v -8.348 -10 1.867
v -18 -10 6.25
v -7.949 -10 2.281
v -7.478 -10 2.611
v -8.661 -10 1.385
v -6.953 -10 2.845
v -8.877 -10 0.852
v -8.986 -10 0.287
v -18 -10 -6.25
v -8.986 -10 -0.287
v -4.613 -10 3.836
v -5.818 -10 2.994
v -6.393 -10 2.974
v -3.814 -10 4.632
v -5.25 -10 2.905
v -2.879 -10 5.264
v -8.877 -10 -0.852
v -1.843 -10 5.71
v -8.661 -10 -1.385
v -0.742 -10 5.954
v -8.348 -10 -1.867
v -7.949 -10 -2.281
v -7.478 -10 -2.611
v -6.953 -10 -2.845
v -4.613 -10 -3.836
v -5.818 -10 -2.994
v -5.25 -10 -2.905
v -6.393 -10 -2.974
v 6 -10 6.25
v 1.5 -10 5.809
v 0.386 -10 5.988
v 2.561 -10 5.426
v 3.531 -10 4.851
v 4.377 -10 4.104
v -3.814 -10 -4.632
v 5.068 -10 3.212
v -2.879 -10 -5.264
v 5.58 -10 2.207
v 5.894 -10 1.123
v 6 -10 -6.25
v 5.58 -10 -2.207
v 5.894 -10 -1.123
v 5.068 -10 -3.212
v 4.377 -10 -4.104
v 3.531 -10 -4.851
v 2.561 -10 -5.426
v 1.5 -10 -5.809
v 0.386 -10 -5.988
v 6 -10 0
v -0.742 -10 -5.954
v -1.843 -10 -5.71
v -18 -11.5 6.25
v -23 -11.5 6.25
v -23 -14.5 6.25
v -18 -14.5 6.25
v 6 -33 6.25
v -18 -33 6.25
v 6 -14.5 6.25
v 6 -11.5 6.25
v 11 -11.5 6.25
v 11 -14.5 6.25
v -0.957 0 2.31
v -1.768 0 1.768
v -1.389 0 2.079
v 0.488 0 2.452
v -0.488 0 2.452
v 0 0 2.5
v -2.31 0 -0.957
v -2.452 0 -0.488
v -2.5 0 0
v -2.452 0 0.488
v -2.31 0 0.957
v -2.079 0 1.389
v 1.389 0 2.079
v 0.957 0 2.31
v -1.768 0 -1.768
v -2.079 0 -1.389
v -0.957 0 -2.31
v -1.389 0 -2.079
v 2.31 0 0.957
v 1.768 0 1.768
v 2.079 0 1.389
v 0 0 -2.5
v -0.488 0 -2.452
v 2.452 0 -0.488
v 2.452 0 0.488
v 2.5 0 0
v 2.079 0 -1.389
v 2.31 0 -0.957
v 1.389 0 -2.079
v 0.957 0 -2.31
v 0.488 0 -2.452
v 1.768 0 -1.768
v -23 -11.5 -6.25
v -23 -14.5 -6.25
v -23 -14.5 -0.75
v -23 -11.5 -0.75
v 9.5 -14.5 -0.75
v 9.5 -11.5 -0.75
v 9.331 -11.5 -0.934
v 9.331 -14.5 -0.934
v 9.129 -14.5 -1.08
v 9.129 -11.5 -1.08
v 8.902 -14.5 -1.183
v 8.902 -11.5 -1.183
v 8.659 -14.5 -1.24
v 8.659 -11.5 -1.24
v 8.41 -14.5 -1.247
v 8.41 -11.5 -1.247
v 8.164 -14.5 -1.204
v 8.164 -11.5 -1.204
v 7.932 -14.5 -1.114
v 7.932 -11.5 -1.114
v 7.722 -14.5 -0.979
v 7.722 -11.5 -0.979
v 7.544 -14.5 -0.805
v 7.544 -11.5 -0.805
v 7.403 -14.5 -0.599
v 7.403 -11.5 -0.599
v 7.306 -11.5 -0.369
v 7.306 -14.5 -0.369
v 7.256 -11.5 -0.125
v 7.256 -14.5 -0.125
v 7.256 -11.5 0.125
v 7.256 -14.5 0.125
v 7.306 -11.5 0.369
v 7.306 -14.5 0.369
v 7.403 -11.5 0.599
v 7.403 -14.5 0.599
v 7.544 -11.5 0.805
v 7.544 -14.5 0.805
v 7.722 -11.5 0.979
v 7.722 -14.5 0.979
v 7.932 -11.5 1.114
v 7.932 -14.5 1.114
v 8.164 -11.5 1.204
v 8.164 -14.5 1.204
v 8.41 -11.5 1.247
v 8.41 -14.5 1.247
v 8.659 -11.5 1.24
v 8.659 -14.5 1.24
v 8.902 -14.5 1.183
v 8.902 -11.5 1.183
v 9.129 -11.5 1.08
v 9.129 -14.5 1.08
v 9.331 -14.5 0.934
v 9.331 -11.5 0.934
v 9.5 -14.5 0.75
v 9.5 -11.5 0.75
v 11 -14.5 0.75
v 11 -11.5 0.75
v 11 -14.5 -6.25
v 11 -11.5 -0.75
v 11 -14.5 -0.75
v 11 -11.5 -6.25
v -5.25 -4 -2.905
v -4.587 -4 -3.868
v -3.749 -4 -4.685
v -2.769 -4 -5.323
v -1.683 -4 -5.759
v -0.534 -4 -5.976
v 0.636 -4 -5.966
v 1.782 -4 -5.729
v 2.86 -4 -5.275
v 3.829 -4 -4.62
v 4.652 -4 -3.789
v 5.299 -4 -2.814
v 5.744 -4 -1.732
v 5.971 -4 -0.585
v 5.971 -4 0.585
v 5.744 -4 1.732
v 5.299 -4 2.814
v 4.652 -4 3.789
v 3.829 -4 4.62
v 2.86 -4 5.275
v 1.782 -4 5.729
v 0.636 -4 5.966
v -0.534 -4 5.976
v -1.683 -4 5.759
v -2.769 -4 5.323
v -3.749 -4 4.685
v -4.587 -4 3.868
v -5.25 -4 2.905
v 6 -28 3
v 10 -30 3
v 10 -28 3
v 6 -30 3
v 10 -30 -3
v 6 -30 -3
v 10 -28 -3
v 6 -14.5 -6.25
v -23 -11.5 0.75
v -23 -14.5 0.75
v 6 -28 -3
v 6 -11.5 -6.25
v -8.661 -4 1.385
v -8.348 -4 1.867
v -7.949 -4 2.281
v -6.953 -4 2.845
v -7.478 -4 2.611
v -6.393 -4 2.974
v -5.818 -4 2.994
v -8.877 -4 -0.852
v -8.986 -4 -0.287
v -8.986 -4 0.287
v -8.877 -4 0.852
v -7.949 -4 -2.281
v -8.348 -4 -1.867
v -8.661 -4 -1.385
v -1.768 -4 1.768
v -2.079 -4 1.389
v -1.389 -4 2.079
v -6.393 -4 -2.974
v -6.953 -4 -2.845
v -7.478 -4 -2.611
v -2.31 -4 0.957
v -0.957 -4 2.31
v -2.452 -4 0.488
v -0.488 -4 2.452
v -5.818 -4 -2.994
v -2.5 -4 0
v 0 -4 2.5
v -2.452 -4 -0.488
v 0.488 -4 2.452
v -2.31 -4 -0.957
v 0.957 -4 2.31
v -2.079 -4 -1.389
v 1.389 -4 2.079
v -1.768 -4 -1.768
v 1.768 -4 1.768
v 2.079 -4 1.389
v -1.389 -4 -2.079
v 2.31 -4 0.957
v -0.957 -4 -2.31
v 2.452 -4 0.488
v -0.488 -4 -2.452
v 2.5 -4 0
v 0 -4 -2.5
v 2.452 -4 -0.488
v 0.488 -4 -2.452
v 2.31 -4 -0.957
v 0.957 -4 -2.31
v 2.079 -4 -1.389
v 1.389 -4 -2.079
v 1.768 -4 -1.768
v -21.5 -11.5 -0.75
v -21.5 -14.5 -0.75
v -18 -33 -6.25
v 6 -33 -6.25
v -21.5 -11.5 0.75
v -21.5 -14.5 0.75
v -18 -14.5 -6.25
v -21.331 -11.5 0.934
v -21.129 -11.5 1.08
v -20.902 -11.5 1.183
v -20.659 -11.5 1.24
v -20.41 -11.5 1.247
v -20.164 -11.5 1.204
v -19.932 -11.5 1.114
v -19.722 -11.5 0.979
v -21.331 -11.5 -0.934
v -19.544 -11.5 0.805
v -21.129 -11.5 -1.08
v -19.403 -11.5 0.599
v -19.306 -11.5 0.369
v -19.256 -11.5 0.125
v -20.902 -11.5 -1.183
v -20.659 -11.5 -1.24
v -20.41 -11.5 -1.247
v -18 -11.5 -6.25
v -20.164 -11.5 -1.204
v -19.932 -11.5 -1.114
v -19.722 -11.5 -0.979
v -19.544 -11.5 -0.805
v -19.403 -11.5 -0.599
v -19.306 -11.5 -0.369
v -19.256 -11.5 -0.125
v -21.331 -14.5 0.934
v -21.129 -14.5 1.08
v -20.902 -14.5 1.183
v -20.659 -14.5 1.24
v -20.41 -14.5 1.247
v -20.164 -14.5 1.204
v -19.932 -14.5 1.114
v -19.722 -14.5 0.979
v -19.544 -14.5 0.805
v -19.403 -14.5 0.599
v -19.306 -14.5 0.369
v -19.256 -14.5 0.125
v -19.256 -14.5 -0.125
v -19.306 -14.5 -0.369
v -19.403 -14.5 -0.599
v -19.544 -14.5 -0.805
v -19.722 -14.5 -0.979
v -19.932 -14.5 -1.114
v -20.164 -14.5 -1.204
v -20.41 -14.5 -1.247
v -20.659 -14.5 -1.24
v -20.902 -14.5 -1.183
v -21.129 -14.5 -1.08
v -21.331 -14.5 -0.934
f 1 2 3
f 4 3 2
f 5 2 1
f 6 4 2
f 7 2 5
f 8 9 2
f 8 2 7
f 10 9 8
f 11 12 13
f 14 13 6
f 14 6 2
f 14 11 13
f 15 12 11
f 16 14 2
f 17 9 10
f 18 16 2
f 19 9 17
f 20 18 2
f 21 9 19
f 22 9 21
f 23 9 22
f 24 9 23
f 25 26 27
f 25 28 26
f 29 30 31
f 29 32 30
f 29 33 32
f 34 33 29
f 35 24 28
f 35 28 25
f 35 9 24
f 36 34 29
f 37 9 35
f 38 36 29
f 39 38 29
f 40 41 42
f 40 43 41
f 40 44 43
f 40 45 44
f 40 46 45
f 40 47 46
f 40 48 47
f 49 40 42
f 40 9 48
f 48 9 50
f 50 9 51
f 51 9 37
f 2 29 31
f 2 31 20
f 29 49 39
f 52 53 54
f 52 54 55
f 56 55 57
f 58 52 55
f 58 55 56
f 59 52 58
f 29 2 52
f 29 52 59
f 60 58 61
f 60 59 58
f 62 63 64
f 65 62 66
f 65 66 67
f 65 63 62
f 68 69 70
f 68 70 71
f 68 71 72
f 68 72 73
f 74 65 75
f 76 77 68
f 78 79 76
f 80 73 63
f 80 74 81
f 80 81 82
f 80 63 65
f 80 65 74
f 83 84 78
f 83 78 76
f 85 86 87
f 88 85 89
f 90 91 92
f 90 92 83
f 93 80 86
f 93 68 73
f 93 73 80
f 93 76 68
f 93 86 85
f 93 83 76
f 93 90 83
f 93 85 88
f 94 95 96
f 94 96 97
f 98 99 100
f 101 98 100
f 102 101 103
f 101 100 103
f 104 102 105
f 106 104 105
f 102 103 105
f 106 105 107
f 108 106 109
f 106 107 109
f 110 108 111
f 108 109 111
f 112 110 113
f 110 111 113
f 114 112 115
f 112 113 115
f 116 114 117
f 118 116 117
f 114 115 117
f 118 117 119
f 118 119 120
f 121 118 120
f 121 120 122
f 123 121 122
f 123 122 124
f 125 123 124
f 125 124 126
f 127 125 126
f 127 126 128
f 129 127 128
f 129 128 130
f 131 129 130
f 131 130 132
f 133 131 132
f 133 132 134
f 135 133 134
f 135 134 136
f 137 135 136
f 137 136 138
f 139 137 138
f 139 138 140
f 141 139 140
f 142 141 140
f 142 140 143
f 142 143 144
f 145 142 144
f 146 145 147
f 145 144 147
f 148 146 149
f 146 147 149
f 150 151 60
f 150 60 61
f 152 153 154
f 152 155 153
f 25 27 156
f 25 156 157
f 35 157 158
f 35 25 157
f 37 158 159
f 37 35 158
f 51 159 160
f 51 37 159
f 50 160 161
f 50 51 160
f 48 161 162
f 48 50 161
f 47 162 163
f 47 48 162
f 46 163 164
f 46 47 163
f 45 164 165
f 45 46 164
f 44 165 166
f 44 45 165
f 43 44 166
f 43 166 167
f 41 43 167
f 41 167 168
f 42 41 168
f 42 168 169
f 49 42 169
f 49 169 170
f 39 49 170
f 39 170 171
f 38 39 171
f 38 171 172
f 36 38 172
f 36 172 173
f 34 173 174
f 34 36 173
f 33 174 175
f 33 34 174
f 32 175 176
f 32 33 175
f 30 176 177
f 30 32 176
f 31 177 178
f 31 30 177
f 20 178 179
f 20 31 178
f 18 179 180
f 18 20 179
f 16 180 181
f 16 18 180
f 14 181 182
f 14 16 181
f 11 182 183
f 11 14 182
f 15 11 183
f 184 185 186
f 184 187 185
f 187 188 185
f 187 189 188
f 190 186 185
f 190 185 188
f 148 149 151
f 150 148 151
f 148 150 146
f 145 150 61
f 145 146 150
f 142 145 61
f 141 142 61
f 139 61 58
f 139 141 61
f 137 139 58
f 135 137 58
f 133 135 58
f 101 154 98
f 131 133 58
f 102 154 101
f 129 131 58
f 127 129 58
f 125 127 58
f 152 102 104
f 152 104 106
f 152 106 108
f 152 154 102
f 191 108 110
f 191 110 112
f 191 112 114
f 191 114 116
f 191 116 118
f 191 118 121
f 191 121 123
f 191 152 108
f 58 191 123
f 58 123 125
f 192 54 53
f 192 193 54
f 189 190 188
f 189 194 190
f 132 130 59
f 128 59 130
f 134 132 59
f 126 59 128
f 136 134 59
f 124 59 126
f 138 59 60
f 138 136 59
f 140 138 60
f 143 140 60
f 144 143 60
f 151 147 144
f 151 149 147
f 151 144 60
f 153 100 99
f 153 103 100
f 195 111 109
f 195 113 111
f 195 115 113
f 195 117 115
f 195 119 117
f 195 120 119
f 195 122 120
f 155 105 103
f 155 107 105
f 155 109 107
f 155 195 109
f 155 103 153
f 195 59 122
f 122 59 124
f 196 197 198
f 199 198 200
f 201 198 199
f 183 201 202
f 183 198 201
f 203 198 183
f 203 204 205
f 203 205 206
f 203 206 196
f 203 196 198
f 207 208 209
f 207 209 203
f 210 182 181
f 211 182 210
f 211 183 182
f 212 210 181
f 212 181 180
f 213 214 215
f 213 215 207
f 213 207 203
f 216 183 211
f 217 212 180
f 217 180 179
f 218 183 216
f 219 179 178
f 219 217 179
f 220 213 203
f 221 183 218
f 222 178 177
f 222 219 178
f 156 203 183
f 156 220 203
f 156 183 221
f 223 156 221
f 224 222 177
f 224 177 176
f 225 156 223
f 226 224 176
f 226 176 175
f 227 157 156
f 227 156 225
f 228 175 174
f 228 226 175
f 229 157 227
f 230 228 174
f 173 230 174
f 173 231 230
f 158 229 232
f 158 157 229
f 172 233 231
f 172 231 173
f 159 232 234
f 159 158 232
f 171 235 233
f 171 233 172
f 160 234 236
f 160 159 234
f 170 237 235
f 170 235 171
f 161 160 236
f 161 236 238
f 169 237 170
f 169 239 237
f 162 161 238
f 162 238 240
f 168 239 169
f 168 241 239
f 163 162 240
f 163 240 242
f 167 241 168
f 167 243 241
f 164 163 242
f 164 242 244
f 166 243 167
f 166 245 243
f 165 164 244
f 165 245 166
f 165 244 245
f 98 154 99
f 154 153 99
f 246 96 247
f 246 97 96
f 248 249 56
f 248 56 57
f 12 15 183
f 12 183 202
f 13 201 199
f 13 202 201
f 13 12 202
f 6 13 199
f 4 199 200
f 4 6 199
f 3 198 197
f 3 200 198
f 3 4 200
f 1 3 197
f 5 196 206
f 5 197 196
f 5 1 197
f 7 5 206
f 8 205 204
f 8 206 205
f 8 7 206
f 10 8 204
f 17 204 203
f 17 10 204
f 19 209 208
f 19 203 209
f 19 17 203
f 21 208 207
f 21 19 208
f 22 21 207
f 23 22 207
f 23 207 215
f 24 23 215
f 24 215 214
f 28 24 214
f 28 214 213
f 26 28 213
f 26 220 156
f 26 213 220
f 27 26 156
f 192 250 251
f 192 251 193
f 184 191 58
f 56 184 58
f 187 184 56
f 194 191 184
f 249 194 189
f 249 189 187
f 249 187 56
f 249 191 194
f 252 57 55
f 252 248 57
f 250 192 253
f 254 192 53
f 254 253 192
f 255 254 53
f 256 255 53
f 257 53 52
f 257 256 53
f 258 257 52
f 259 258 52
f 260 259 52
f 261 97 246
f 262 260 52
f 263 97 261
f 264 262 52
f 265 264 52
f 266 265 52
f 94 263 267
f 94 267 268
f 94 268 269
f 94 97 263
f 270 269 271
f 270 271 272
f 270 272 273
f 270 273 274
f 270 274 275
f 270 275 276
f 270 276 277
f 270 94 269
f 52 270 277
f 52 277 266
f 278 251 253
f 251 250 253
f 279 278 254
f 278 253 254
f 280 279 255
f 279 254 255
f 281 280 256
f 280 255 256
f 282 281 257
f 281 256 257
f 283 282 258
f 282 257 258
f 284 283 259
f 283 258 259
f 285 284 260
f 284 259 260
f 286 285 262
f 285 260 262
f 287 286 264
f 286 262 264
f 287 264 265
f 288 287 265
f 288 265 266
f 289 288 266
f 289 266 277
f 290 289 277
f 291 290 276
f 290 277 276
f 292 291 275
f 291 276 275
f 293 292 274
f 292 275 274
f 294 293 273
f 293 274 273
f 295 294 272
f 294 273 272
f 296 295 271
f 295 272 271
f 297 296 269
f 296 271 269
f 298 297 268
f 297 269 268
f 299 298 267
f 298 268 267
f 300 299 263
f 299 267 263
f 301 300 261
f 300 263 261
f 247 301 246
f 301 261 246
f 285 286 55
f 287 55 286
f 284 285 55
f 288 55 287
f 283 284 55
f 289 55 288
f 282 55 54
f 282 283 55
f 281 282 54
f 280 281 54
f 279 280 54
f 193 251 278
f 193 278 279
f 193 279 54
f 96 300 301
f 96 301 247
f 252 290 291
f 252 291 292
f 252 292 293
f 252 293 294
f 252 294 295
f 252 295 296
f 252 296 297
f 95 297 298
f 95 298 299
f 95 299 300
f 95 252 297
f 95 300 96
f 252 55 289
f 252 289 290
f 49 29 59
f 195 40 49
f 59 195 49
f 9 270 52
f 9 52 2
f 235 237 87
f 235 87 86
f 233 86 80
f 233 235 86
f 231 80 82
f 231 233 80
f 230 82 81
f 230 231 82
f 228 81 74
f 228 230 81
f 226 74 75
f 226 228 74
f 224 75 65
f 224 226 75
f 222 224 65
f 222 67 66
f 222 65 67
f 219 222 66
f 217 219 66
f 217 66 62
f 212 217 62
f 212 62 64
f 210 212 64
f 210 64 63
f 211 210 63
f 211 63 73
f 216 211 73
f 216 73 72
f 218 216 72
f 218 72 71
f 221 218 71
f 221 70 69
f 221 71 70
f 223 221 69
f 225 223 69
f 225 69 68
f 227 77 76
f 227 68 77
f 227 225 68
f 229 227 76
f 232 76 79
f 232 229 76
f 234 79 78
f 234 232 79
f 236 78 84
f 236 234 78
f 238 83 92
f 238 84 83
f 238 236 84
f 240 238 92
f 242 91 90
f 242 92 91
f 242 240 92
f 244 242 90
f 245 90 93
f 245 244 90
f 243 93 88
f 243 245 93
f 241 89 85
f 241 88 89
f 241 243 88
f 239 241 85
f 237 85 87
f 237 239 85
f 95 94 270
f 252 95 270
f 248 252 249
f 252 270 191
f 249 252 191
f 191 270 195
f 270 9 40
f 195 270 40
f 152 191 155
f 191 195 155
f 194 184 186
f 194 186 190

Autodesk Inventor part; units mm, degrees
ref_plane "YZ Plane" through (0, 0, 0) normal (1, 0, 0) x (0, 1, 0)
ref_plane "XZ Plane" through (0, 0, 0) normal (0, 1, 0) x (-1, 0, 0)
ref_plane "XY Plane" through (0, 0, 0) normal (0, 0, 1) x (1, 0, 0)
sketch "草圖1" plane through (0, 0, 0) normal (0, 0, 1) x (1, 0, 0)
  line L0 (-18, -14.5) -> (6, -14.5)
  line L1 (6, -14.5) -> (6, -33)
  line L2 (6, -33) -> (-18, -33)
  line L3 (-18, -33) -> (-18, -14.5)
  line L4 (-23, -11.5) -> (11, -11.5)
  line L5 (11, -11.5) -> (11, -14.5)
  line L6 (11, -14.5) -> (-23, -14.5)
  line L7 (-23, -14.5) -> (-23, -11.5)
  line L8 (6, -11.5) -> (-18, -11.5)
  line L9 (-18, -11.5) -> (-18, -10)
  line L10 (-18, -10) -> (6, -10)
  line L11 (6, -10) -> (6, -11.5)
  line L12 (6, -10) -> (-9, -10)
  line L13 (-9, -10) -> (-9, -4)
  line L14 (-9, -4) -> (6, -4)
  line L15 (6, -4) -> (6, -10)
  line L16 (2.5, -4) -> (-2.5, -4)
  line L17 (-2.5, -4) -> (-2.5, 0)
  line L18 (-2.5, 0) -> (2.5, 0)
  line L19 (2.5, 0) -> (2.5, -4)
  point P0 (0, 0)
  point P1 (-6, -14.5)
  point P2 (-6, -11.5)
  point P3 (0, -4)
  point P4 (-18, -11.5)
  point P5 (6, -14.5)
  point P6 (0, 0)
  dimension "d0" = 24
  dimension "d1" = 18.5
  dimension "d2" = 34
  dimension "d3" = 3
  dimension "d4" = 1.5
  dimension "d5" = 6
  dimension "d6" = 9
  dimension "d7" = 5
  dimension "d8" = 4
  dimension "d9" = 6
extrude "擠出1" add sketch "草圖1" along normal mid plane 12.5 contours L6 L7 L4 L5 L0 | L0 L1 L2 L3 | L9 L10 L11 L4
sketch "草圖2" plane through (-18, -10, 6.25) normal (0, 1, 0) x (1, 0, 0)
  circle A0 centre (18, 6.25) radius 6
  circle A1 centre (12, 6.25) radius 3
  line L0 (0, 12.5) -> (0, 0) construction
  point P0 (9, 6.25)
  point P1 (0, 6.25)
  point P2 (12.75, 9.1547)
  point P3 (12.75, 3.3453)
  dimension "d13" = 12
  dimension "d14" = 9
extrude "擠出2" add sketch "草圖2" along normal blind 6
sketch "草圖3" plane through (-18, -4, 6.25) normal (0, 1, 0) x (1, 0, 0)
  circle A0 centre (18, 6.25) radius 2.5
  dimension "d17" = 5
extrude "擠出3" add sketch "草圖3" along normal blind 4
sketch "草圖4" plane through (-23, -11.5, 6.25) normal (0, 1, 0) x (1, 0, 0)
  line L0 (0, 12.5) -> (0, 0) construction
  line L1 (5, 0) -> (0, 0) construction
  line L2 (5, 12.5) -> (5, 0) construction
  line L3 (0, 12.5) -> (5, 12.5) construction
  line L4 (0, 6.25) -> (5, 6.25) construction
  circle A0 centre (2.5, 6.25) radius 1.25
  line L5 (0, 12.5) -> (0, 0) projected
  line L6 (0, 7) -> (1.5, 7)
  line L7 (1.5, 7) -> (1.5, 5.5)
  line L8 (1.5, 5.5) -> (0, 5.5)
  line L9 (0, 5.5) -> (0, 7)
  line L10 (0, 9.2582) -> (34, 9.2582) construction
  line L11 (34, 12.5) -> (34, 0) projected
  line L12 (17, 9.2582) -> (17, 6.5712) construction
  circle A1 centre (31.5, 6.25) radius 1.25
  line L13 (34, 7) -> (32.5, 7)
  line L14 (32.5, 7) -> (32.5, 5.5)
  line L15 (32.5, 5.5) -> (34, 5.5)
  line L16 (34, 5.5) -> (34, 7)
  point P0 (23, 6.25)
  point P1 (0, 5.5)
  point P2 (1.5, 7)
  point P3 (34, 6.25)
  dimension "d20" = 2.5
  dimension "d21" = 1.5
  dimension "d22" = 14.5
extrude "擠出4" cut sketch "草圖4" against normal up to surface (3 mm away)
sketch "草圖5" plane through (6, -33, 6.25) normal (1, 0, 0) x (0, 0, -1)
  line L0 (12.5, 18.5) -> (0, 18.5) construction
  line L1 (0, 0) -> (0, 18.5) construction
  line L2 (12.5, 0) -> (0, 0) construction
  line L3 (12.5, 18.5) -> (12.5, 0) construction
  line L4 (0, 18.5) -> (0, 0) construction
  line L5 (0, 5) -> (3.25, 5) construction
  line L6 (3.25, 5) -> (9.25, 5)
  line L7 (9.25, 5) -> (9.25, 3)
  line L8 (9.25, 3) -> (3.25, 3)
  line L9 (3.25, 3) -> (3.25, 5)
  line L10 (3.25, 5) -> (9.25, 5)
  line L11 (9.25, 5) -> (12.5, 5) construction
  point P0 (6.25, 33)
  dimension "d25" = 6
  dimension "d26" = 13.5
  dimension "d27" = 3
extrude "擠出5" add sketch "草圖5" along normal blind 4
properties part number "MG90_II"
